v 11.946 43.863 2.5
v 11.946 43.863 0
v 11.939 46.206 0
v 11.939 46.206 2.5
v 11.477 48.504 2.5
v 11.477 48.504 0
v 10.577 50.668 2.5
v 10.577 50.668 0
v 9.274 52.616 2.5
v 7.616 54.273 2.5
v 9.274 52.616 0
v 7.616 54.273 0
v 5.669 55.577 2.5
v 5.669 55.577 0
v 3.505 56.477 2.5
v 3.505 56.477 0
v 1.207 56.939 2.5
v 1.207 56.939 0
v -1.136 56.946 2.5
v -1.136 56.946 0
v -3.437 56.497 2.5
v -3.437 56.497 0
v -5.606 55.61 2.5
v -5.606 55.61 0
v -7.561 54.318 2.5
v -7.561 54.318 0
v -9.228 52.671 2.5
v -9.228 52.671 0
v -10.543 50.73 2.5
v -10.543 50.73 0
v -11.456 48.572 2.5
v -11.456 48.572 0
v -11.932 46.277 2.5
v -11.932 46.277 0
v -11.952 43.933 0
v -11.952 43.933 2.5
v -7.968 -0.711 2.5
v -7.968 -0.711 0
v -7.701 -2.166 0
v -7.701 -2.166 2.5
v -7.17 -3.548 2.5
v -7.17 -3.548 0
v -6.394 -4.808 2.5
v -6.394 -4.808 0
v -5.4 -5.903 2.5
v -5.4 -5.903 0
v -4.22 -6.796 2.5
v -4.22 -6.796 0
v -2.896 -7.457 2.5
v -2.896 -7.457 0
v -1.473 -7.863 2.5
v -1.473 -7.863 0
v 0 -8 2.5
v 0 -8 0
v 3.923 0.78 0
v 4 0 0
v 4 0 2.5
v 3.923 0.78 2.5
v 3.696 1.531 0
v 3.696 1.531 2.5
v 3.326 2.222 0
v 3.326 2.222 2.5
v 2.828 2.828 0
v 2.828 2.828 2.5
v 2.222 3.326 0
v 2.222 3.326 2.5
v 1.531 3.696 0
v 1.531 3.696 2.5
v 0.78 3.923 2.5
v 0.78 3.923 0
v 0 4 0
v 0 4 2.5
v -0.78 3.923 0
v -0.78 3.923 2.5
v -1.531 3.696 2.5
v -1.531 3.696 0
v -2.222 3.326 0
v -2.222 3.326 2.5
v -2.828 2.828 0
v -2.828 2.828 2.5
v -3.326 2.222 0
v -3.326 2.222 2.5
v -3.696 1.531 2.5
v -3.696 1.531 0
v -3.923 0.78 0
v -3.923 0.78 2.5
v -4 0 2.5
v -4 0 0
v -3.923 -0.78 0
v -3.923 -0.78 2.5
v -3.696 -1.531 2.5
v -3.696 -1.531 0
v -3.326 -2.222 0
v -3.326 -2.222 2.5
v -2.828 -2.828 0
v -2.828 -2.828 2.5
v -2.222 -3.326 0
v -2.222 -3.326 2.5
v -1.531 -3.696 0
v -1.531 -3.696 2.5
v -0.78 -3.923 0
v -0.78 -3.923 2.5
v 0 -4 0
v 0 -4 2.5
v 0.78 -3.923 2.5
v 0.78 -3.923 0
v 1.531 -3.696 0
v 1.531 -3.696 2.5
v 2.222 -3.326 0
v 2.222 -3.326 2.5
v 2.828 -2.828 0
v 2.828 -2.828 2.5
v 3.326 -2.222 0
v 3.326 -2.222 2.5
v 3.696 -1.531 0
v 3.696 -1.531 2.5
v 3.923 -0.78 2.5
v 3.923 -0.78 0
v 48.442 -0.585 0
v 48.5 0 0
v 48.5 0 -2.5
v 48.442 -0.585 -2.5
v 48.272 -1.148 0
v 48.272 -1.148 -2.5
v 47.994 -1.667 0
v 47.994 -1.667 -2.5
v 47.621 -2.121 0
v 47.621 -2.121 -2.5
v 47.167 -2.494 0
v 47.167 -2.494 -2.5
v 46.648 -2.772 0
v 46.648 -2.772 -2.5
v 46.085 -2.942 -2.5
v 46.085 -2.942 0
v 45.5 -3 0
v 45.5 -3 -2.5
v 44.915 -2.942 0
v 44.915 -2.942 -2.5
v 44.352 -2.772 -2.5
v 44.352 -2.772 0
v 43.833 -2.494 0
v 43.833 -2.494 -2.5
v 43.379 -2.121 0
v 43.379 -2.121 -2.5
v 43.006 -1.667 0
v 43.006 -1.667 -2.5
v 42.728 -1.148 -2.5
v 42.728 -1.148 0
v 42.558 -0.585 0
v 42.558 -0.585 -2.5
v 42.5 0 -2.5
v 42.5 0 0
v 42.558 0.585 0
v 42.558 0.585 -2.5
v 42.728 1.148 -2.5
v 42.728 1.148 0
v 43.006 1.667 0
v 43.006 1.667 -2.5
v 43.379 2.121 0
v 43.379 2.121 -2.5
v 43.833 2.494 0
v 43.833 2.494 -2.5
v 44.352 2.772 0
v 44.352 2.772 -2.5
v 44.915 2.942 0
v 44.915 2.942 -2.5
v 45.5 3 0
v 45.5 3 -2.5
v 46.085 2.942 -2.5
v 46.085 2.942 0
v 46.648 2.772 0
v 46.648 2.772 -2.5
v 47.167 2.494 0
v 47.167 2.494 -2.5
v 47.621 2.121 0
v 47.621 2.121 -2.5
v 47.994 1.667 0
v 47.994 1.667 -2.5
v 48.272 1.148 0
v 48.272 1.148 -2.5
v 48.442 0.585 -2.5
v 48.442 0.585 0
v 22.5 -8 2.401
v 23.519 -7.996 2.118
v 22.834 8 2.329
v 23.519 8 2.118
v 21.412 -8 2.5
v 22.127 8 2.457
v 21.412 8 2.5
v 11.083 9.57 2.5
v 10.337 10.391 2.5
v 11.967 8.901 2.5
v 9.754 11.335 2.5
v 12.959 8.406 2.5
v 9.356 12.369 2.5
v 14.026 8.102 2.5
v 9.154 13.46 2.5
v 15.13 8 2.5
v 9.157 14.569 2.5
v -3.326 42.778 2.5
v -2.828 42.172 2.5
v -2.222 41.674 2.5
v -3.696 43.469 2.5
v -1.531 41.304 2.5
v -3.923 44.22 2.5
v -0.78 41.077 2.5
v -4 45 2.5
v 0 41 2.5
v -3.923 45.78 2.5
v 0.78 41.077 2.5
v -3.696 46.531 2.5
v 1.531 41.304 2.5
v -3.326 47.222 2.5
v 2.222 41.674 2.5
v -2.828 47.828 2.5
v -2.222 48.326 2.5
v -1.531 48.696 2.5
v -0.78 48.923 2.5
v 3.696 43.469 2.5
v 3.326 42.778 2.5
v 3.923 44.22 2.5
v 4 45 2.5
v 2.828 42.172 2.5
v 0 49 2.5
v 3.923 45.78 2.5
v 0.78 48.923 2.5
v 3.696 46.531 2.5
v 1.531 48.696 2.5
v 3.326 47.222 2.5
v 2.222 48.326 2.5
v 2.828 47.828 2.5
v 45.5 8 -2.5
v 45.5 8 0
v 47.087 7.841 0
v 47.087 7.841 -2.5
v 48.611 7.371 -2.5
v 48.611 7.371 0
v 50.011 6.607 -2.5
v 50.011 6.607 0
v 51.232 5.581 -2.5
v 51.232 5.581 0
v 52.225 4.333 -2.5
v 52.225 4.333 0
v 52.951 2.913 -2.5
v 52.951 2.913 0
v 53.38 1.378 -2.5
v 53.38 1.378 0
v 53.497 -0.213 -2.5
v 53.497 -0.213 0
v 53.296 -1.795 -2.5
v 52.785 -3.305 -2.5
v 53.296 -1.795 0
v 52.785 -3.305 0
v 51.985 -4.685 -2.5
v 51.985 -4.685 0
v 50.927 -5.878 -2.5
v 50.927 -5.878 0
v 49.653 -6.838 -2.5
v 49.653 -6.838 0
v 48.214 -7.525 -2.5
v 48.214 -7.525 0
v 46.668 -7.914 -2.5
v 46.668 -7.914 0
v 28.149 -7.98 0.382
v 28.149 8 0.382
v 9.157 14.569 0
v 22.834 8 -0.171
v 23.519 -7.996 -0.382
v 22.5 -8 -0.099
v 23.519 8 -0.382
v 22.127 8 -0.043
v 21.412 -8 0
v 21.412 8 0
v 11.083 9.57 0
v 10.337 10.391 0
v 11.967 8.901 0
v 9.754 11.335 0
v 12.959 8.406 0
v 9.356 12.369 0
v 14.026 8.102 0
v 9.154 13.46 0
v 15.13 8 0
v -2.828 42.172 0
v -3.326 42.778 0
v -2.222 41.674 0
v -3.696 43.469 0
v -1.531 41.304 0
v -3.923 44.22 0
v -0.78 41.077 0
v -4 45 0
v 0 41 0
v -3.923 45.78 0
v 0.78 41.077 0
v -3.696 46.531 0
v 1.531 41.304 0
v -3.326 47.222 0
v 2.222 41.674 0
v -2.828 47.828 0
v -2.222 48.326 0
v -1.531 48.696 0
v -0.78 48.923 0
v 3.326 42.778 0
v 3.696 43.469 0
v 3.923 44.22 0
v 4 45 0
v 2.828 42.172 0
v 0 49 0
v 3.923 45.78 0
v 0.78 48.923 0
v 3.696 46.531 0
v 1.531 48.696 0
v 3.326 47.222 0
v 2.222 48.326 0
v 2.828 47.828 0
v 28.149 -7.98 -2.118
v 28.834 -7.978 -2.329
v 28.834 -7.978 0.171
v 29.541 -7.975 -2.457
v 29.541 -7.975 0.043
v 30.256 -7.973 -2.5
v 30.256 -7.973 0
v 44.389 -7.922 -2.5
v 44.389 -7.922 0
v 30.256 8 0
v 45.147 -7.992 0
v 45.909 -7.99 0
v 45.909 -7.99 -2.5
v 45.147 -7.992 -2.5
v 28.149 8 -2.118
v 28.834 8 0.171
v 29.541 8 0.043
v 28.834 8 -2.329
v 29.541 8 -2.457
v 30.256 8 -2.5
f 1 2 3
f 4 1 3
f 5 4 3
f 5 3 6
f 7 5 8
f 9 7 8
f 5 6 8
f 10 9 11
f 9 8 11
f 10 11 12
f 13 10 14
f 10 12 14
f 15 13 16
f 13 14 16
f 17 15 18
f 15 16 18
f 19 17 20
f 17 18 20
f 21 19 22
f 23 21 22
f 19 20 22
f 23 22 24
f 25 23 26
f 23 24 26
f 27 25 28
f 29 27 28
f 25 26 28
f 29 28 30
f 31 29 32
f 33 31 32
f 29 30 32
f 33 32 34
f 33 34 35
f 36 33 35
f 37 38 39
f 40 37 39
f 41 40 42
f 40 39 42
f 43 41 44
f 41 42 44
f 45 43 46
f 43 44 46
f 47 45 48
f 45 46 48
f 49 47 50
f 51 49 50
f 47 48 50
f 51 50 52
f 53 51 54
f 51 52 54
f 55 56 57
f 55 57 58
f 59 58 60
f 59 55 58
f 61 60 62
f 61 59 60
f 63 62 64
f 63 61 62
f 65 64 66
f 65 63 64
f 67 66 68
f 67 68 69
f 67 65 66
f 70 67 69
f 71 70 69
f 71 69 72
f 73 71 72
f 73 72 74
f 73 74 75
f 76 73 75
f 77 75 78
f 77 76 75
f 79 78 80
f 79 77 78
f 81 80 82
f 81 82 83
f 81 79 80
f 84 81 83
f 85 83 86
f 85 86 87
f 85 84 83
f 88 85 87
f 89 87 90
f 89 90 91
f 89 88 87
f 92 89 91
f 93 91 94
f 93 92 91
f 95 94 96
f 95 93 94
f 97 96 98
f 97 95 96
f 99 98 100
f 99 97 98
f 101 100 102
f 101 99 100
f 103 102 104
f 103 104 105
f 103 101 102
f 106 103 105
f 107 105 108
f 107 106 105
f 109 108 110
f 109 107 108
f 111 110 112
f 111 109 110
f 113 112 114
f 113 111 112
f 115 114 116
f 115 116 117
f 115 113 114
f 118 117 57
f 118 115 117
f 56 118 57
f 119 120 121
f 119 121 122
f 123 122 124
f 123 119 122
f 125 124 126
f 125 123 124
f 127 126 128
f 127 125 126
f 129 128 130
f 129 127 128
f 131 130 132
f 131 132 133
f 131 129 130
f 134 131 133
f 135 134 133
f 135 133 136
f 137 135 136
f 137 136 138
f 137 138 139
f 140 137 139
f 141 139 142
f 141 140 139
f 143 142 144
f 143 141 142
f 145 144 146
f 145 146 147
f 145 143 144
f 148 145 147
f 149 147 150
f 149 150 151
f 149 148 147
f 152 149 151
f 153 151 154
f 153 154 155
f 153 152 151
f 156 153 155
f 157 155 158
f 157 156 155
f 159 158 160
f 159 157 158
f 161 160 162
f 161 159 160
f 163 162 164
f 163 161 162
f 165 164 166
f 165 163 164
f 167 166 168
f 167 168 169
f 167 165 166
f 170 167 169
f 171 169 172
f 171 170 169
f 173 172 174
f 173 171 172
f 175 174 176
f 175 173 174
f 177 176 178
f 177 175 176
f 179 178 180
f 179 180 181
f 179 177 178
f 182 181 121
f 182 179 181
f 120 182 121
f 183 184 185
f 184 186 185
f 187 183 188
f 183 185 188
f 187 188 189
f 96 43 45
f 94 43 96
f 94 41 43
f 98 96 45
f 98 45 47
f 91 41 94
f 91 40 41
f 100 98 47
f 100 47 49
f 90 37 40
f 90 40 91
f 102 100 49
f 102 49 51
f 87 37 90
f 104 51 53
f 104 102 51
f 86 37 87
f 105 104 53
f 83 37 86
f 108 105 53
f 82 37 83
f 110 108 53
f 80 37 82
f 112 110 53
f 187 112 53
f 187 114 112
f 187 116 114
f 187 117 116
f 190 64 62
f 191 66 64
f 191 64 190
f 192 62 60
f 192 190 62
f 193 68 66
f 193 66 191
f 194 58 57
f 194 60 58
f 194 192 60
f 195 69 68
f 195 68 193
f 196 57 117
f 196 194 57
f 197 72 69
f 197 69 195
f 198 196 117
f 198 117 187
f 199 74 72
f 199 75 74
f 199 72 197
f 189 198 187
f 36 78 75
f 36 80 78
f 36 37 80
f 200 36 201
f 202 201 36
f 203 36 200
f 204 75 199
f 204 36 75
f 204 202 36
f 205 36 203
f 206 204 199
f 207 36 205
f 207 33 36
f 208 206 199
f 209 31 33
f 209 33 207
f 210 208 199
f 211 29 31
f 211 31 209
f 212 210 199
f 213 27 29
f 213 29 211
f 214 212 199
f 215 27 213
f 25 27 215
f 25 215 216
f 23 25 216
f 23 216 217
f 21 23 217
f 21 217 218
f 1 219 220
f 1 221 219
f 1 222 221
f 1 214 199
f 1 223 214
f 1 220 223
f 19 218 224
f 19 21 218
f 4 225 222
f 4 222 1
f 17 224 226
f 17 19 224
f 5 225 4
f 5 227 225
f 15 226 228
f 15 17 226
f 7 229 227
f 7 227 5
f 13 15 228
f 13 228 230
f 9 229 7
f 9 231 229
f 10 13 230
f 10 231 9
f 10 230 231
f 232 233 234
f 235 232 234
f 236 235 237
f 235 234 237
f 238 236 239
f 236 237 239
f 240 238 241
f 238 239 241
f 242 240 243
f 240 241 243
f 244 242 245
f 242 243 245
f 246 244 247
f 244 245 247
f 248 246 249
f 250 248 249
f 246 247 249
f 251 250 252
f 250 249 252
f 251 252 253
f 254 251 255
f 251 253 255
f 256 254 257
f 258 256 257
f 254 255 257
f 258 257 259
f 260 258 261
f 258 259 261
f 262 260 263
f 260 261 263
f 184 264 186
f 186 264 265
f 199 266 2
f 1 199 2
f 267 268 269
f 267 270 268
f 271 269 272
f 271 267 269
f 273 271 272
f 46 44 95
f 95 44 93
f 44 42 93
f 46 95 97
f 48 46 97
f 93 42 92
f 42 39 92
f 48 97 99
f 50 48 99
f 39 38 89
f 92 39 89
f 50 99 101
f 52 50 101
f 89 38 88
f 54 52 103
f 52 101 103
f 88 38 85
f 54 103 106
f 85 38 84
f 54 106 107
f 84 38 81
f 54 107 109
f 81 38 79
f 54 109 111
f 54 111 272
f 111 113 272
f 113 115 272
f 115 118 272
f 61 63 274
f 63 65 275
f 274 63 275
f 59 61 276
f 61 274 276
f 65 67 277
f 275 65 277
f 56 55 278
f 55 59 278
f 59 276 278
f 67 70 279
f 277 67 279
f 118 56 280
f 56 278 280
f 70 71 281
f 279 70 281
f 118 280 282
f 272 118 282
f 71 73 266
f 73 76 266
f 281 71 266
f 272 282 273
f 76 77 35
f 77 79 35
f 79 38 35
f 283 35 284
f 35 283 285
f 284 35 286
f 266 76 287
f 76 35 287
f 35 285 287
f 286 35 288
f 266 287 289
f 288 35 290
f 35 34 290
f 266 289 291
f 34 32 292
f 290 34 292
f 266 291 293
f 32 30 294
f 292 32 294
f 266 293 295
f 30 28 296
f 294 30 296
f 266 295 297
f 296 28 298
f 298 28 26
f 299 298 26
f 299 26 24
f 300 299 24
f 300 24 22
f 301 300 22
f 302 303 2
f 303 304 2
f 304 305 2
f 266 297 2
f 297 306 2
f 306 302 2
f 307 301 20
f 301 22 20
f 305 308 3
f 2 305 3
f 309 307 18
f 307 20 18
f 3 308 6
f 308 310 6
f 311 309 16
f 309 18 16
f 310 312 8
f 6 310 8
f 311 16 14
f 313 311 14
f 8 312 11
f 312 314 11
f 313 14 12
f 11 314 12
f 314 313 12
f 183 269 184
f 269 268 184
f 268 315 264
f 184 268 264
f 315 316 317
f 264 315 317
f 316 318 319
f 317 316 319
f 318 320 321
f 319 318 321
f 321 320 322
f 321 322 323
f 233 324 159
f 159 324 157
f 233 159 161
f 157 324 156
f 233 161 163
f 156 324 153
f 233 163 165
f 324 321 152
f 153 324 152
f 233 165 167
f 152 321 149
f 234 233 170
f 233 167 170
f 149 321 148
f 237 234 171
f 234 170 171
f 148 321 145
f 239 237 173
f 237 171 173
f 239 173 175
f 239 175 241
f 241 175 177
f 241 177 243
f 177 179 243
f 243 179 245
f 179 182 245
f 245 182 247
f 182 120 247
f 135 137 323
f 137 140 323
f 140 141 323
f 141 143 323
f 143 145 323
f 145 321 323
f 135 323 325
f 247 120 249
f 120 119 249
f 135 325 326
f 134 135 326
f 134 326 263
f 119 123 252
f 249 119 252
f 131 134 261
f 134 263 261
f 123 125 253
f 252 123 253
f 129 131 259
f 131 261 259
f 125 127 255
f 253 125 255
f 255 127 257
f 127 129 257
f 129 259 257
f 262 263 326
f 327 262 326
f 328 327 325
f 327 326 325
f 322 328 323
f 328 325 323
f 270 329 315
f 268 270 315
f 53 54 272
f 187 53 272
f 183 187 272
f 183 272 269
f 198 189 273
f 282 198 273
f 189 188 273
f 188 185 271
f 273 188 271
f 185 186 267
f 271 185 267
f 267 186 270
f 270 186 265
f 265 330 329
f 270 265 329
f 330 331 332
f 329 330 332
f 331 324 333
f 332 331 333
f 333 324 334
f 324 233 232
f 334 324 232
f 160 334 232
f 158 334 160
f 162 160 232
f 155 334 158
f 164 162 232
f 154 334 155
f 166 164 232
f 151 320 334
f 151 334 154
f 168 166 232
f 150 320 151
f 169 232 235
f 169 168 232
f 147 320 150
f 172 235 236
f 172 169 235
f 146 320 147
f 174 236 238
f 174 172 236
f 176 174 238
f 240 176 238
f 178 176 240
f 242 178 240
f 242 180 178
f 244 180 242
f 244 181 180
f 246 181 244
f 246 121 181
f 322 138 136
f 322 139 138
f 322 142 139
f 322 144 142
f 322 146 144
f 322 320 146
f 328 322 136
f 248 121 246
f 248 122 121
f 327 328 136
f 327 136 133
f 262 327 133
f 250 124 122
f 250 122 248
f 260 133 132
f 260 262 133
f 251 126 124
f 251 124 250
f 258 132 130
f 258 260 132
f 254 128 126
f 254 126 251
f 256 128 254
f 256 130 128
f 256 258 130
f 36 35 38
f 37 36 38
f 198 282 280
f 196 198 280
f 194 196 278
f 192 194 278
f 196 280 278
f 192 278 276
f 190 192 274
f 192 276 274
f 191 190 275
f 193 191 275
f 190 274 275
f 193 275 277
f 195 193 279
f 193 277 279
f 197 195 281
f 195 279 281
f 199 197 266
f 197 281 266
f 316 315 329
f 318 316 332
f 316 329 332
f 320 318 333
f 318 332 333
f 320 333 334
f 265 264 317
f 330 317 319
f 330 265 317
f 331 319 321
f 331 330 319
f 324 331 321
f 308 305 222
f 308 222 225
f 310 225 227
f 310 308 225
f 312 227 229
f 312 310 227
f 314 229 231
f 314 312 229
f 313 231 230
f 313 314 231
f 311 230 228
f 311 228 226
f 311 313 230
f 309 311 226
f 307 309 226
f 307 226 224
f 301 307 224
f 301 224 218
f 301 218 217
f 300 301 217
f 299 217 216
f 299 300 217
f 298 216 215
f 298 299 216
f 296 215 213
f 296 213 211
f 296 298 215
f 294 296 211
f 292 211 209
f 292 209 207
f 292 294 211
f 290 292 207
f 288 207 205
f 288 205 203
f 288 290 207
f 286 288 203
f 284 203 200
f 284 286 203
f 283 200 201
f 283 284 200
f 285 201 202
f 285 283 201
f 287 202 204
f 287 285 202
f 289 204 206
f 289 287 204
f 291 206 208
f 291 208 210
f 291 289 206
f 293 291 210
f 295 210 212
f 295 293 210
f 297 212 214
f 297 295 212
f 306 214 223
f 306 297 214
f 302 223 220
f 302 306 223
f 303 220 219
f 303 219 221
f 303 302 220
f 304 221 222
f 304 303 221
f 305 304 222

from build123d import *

# Parameters (mm, degrees)
F0_R      = 4
F1_DEPTH  = 2.5
F3_R      = 3
F4_DEPTH  = 2.5
F1_FACE_W = 16
F1_FACE_H = 2.5
F4_FACE_W = 15.976364256
F4_FACE_H = 2.5
F7_R      = 6
F8_R      = 6


with BuildPart() as f1:
    # F0 (on Top) → F1 (new body)
    with BuildSketch(Plane.XY):
        with BuildLine():
            Line((9.1568758371, 14.5686935942), (11.9459763261, 43.8626128117))
            ThreePointArc((11.9459763261, 43.8626128117), (0.0355103222, 56.9999474589), (-11.9524985765, 43.9333333333))
            Line((-11.9524985765, 43.9333333333), (-7.9683323844, -0.7111111111))
            ThreePointArc((-7.9683323844, -0.7111111111), (-5.3995884617, -5.902918299), (0, -8))
            Line((0, -8), (22.5, -8))
            Line((22.5, -8), (22.5, 8))
            Line((22.5, 8), (15.1298640001, 8))
            ThreePointArc((15.1298640001, 8), (10.6907108396, 9.9634272932), (9.1568758371, 14.5686935942))
        make_face()
        Circle(F0_R, mode=Mode.SUBTRACT)
        with Locations((0, 45)):
            Circle(F0_R, mode=Mode.SUBTRACT)
    extrude(amount=-F1_DEPTH)


with BuildPart() as f4:
    # F3 (on offset) → F4 (new body)
    with BuildSketch(Plane(origin=(0, 0, 0), x_dir=(1, 0, 0), z_dir=(0, 0, -1))):
        with BuildLine():
            Line((29.1677432093, -8), (45.5, -8))
            ThreePointArc((45.5, -8), (53.478553963, -0.5853859069), (46.6676332619, 7.914330835))
            Line((46.6676332619, 7.914330835), (44.3885046452, 7.9224098655))
            Line((44.3885046452, 7.9224098655), (29.1677432093, 7.976364256))
            Line((29.1677432093, 7.976364256), (29.1677432093, -8))
        make_face()
        with Locations((45.5, 0)):
            Circle(F3_R, mode=Mode.SUBTRACT)
        with BuildLine():
            Line((44.3885046452, 7.9224098655), (46.6676332619, 7.914330835))
            ThreePointArc((46.6676332619, 7.914330835), (45.5283581353, 7.9999497384), (44.3885046452, 7.9224098655))
        make_face()
    extrude(amount=-F4_DEPTH)


with BuildPart() as f5:
    # F1_face (on face) → F5 section 0
    with BuildSketch(Plane(origin=(22.5, 0, -1.25), x_dir=(0, 1, 0), z_dir=(1, 0, 0))):
        Rectangle(F1_FACE_W, F1_FACE_H)
    # F4_face (on face) → F5 section 1
    with BuildSketch(Plane(origin=(29.1677432093, 0.011817872, 1.25), x_dir=(0, -1, 0), z_dir=(-1, 0, 0))):
        Rectangle(F4_FACE_W, F4_FACE_H)
    loft()


with BuildPart() as f1_1:
    add(f1.part)

    # F6: union F4, F5
    add(f4.part)
    add(f5.part)

    # F7
    f7_edges = [f1_1.edges().sort_by_distance(p)[0] for p in [
        (22.5, 0, 0),
        (29.167743, 0.011818, 2.5),
    ]]
    fillet(f7_edges, radius=F7_R)

    # F8
    f8_edges = [f1_1.edges().sort_by_distance(p)[0] for p in [
        (29.167743, 0.011818, 0),
        (22.5, 0, -2.5),
    ]]
    fillet(f8_edges, radius=F8_R)


with BuildPart() as f9_1:
    # F9: instance of F1
    add(f1_1.part.mirror(Plane.XY))


solid = f9_1.part
